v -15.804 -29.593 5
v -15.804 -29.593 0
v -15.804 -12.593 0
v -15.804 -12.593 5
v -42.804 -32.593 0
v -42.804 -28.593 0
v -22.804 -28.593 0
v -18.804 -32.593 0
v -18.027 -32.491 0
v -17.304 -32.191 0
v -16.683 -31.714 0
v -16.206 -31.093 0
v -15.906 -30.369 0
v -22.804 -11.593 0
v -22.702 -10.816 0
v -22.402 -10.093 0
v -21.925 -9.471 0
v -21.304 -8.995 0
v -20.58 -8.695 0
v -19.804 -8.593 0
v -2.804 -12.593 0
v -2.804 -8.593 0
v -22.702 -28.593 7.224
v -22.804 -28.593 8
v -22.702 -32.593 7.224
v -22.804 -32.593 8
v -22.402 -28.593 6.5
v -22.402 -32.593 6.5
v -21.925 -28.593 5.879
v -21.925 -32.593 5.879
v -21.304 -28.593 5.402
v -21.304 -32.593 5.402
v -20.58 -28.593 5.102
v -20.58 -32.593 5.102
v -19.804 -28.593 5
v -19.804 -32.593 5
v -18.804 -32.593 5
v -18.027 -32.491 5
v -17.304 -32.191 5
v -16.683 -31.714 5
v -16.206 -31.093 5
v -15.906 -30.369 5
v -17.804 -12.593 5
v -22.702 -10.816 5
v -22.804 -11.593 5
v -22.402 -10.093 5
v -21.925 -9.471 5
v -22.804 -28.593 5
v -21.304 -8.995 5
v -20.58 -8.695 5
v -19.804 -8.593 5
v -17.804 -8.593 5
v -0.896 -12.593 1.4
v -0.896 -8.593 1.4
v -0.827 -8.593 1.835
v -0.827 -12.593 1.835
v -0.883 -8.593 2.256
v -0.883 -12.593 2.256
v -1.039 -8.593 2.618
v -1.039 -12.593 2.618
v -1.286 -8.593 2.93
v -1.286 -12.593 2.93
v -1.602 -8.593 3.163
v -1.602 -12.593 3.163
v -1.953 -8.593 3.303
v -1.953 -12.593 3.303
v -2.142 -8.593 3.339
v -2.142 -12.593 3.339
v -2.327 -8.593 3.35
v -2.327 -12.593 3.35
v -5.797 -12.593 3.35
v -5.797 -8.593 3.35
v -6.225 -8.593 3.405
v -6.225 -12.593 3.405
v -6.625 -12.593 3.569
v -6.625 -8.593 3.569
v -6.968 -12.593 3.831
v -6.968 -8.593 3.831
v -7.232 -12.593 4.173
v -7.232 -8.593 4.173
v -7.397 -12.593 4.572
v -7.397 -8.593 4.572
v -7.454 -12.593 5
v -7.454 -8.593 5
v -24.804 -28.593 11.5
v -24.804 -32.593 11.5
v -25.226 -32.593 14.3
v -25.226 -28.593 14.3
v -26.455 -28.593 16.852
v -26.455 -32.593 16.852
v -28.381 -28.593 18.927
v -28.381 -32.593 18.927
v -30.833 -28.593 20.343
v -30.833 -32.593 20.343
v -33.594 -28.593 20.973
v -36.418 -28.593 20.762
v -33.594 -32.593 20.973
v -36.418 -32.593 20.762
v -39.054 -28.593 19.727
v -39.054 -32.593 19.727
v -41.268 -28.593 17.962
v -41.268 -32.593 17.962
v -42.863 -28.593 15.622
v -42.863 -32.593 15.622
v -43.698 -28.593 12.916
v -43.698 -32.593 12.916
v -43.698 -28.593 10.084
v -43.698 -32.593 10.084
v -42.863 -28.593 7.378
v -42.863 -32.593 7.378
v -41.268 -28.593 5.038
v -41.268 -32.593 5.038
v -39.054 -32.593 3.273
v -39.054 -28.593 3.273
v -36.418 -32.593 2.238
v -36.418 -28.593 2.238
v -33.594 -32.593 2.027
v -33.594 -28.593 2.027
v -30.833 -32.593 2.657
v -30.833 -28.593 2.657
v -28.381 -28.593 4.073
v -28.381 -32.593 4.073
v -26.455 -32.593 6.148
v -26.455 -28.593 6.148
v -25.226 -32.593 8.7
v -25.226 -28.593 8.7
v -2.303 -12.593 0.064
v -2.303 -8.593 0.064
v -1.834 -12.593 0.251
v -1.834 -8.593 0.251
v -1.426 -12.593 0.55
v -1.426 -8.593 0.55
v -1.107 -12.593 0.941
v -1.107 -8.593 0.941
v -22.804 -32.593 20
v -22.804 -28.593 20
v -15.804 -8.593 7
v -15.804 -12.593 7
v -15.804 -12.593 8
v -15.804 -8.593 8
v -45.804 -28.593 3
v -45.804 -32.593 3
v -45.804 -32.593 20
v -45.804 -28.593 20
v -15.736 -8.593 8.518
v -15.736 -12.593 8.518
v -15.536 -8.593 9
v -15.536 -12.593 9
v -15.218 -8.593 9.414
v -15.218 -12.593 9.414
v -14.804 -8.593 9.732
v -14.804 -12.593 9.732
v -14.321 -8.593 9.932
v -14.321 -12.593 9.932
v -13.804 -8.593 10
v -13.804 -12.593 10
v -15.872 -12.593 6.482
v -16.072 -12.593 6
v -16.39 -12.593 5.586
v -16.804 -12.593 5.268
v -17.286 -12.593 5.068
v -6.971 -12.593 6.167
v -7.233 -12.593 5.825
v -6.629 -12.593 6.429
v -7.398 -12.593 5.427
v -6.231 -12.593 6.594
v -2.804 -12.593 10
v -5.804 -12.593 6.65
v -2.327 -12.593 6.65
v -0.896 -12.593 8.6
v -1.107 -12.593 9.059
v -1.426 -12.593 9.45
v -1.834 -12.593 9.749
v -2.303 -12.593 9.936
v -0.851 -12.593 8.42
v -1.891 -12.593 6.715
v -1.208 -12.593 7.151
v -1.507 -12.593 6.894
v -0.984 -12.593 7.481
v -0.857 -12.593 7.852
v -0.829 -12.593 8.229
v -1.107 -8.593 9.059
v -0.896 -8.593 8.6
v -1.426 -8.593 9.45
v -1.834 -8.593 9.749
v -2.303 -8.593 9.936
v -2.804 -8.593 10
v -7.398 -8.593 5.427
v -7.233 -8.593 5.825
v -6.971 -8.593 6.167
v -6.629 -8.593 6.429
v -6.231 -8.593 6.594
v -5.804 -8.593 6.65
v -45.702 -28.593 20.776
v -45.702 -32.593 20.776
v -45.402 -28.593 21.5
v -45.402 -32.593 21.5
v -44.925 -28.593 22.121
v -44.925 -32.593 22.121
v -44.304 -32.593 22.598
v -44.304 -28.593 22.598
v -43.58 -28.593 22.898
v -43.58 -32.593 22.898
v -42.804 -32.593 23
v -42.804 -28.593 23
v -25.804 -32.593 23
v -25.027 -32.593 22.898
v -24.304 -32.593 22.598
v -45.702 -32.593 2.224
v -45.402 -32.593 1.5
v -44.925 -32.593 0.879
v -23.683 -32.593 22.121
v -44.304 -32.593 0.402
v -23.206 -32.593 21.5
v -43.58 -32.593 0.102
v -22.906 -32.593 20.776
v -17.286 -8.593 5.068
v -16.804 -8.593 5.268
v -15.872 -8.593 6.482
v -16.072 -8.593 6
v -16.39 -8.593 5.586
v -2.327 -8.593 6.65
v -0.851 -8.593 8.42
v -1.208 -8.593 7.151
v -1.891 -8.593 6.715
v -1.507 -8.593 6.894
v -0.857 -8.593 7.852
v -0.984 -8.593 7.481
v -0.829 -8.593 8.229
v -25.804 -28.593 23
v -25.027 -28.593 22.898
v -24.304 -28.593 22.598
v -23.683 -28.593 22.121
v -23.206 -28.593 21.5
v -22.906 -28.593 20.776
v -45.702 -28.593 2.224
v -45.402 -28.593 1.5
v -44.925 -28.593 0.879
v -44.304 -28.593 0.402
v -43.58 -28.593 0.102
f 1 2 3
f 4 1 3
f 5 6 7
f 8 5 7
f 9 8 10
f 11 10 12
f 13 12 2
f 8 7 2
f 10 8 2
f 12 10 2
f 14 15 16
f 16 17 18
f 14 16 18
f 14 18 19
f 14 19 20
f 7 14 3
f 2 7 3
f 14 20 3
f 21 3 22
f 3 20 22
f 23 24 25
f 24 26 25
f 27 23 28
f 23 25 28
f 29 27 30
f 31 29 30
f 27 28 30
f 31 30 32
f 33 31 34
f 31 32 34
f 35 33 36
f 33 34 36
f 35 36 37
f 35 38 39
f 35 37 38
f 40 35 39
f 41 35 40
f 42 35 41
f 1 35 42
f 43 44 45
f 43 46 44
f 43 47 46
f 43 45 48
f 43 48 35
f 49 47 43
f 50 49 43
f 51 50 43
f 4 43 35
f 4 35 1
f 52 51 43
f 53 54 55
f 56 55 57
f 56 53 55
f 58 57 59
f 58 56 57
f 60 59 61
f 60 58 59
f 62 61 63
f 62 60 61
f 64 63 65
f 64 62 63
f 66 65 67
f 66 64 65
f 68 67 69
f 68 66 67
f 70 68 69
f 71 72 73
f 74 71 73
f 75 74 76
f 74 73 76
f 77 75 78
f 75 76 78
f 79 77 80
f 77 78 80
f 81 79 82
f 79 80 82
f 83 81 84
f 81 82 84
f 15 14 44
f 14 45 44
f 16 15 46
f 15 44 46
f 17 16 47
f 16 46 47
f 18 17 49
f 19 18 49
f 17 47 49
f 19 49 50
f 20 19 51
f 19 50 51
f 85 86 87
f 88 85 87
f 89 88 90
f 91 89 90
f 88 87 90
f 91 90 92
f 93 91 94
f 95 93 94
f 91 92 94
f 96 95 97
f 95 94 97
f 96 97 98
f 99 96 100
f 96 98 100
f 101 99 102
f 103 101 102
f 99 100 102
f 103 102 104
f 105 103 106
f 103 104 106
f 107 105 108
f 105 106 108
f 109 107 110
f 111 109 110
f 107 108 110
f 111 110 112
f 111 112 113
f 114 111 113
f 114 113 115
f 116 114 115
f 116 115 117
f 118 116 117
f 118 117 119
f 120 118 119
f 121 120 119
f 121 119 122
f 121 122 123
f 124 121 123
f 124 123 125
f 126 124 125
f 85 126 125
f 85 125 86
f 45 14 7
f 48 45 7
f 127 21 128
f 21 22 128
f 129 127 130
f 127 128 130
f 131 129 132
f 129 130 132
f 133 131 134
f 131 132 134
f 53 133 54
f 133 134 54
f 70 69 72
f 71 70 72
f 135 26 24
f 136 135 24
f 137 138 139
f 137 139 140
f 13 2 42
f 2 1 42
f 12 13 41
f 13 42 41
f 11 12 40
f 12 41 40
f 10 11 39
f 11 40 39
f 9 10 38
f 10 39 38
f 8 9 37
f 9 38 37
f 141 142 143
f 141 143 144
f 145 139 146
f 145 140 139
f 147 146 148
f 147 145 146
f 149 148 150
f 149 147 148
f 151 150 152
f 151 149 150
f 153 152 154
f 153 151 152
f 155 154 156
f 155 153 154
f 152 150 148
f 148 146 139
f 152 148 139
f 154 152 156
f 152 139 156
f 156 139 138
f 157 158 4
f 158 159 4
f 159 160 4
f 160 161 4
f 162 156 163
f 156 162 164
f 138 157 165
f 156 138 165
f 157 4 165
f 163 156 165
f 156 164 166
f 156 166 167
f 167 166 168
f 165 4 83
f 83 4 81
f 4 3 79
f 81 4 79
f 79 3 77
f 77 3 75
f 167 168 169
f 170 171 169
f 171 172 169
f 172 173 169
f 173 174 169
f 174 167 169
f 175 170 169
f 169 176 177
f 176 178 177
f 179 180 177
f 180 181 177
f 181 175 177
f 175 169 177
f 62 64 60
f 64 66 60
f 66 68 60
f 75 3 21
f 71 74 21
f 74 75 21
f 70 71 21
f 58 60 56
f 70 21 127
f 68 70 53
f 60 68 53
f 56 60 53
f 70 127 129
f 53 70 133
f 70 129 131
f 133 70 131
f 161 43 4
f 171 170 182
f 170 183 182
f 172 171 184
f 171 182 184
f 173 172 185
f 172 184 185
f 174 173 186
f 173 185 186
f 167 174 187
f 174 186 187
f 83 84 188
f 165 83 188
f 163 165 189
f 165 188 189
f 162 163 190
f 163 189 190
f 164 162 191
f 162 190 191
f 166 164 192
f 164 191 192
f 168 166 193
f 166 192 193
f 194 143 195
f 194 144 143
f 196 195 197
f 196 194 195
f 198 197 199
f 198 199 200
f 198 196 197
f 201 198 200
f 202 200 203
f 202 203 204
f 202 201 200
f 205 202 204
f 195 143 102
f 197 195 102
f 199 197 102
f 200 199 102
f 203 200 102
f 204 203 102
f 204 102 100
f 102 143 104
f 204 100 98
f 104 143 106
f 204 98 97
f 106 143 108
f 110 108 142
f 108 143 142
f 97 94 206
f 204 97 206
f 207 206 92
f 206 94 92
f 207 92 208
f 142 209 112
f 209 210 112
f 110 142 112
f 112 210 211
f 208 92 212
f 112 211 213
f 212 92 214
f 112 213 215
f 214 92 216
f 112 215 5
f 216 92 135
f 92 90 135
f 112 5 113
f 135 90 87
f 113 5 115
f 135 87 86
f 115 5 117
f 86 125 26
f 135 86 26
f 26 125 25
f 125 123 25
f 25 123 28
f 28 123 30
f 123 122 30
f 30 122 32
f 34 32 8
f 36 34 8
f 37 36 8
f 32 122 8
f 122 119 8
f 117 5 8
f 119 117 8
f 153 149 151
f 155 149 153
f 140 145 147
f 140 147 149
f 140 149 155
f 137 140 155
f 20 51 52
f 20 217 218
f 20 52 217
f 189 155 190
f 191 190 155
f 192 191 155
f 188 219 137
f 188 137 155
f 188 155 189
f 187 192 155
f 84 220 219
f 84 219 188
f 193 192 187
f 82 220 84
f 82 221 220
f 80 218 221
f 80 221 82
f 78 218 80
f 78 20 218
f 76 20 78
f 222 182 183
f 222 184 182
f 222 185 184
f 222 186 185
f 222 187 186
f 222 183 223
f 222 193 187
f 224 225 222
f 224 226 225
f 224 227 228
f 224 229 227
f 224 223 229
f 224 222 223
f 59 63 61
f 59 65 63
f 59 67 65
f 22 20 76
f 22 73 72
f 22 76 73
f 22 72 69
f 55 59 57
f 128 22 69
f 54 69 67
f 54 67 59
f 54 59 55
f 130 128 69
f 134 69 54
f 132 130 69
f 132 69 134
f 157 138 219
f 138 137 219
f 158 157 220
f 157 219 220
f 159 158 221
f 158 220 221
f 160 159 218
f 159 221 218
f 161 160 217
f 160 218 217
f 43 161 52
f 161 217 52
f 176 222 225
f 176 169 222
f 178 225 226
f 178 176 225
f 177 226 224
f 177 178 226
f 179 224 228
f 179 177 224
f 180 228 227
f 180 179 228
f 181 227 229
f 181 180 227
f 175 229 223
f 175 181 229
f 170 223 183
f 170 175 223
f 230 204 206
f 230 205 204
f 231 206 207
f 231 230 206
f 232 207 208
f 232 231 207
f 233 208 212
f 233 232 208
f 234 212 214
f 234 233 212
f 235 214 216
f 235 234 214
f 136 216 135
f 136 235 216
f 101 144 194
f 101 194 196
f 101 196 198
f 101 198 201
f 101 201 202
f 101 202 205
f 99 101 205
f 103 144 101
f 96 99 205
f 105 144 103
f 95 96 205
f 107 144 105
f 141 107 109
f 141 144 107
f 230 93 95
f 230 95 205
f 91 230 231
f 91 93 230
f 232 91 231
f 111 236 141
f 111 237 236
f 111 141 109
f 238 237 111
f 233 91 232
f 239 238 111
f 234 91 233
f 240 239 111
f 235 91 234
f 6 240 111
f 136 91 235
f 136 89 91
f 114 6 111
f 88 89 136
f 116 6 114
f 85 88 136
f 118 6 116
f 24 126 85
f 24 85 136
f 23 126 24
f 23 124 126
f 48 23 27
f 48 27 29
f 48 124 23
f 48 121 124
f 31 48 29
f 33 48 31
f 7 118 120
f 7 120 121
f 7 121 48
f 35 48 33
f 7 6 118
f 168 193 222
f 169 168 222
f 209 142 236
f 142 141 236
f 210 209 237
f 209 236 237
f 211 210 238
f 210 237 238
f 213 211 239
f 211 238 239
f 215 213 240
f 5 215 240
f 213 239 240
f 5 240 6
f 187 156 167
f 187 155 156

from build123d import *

# Parameters (mm, degrees)
F1_DEPTH  = 5
F0_W      = 23
F0_H      = 4
F2_DEPTH  = 23
F4_R      = 3
F3_R      = 9.5
F5_DEPTH  = 25
F0_W_2    = 15
F6_DEPTH  = 10
F7_R      = 2
F9_DEPTH  = 25
F10_DEPTH = 25
F11_R     = 1.5


with BuildPart() as f1:
    # F0 (on Top) → F1 (new body)
    with BuildSketch(Plane.XY):
        Polygon((-15.8038523793, -12.5927883387), (-15.8038523793, -8.5927883387), (-22.8038523793, -8.5927883387), (-22.8038523793, -28.5927883387), (-22.8038523793, -32.5927883387), (-15.8038523793, -32.5927883387), align=None)
    extrude(amount=F1_DEPTH)

    # F0 (on Top) → F2 (join)
    with BuildSketch(Plane.XY):
        with Locations((-34.3038523793, -30.5927883387)):
            Rectangle(F0_W, F0_H)
    extrude(amount=F2_DEPTH)

    # F4
    f4_edges = [f1.edges().sort_by_distance(p)[0] for p in [
        (-22.803852, -30.592788, 5),
        (-22.803852, -30.592788, 23),
        (-45.803852, -30.592788, 23),
        (-45.803852, -30.592788, 0),
        (-22.803852, -8.592788, 2.5),
        (-15.803852, -32.592788, 2.5),
    ]]
    fillet(f4_edges, radius=F4_R)

    # F3 (on face) → F5 (cut)
    with BuildSketch(Plane.XZ.offset(32.5927883387)):
        with Locations((-34.3038523793, 11.5)):
            Circle(F3_R)
    extrude(amount=-F5_DEPTH, mode=Mode.SUBTRACT)

    # F0 (on Top) → F6 (join)
    with BuildSketch(Plane.XY):
        with Locations((-8.3038523793, -10.5927883387)):
            Rectangle(F0_W_2, F0_H)
    extrude(amount=F6_DEPTH)

    # F7
    f7_edges = [f1.edges().sort_by_distance(p)[0] for p in [
        (-15.803852, -10.592788, 5),
        (-15.803852, -10.592788, 10),
        (-0.803852, -10.592788, 10),
        (-0.803852, -10.592788, 0),
    ]]
    fillet(f7_edges, radius=F7_R)

    # F8 (on face) → F9 (cut)
    with BuildSketch(Plane(origin=(0, -8.5927883387, 0), x_dir=(-1, 0, 0), z_dir=(0, 1, 0))):
        with BuildLine():
            ThreePointArc((5.7965948978, 3.350015961), (6.9680098333, 3.8307107192), (7.4538523793, 5))
            ThreePointArc((7.4538523793, 5), (6.9705785683, 6.166726189), (5.8038523793, 6.65))
            ThreePointArc((5.8038523793, 6.65), (4.1538563696, 5.0036287496), (5.7965948978, 3.350015961))
        make_face()
    extrude(amount=-F9_DEPTH, mode=Mode.SUBTRACT)

    # F8 (on face) → F10 (cut)
    with BuildSketch(Plane(origin=(0, -8.5927883387, 0), x_dir=(-1, 0, 0), z_dir=(0, 1, 0))):
        with BuildLine():
            ThreePointArc((5.7965948978, 3.350015961), (4.1538563696, 5.0036287496), (5.8038523793, 6.65))
            Line((5.8038523793, 6.65), (0.8038523793, 6.65))
            Line((0.8038523793, 6.65), (0.8038523793, 3.350015961))
            Line((0.8038523793, 3.350015961), (5.7965948978, 3.350015961))
        make_face()
    extrude(amount=-F10_DEPTH, mode=Mode.SUBTRACT)

    # F11
    f11_edges = [f1.edges().sort_by_distance(p)[0] for p in [
        (-0.803852, -10.592788, 3.350016),
        (-0.803852, -10.592788, 6.65),
    ]]
    fillet(f11_edges, radius=F11_R)


solid = f1.part
